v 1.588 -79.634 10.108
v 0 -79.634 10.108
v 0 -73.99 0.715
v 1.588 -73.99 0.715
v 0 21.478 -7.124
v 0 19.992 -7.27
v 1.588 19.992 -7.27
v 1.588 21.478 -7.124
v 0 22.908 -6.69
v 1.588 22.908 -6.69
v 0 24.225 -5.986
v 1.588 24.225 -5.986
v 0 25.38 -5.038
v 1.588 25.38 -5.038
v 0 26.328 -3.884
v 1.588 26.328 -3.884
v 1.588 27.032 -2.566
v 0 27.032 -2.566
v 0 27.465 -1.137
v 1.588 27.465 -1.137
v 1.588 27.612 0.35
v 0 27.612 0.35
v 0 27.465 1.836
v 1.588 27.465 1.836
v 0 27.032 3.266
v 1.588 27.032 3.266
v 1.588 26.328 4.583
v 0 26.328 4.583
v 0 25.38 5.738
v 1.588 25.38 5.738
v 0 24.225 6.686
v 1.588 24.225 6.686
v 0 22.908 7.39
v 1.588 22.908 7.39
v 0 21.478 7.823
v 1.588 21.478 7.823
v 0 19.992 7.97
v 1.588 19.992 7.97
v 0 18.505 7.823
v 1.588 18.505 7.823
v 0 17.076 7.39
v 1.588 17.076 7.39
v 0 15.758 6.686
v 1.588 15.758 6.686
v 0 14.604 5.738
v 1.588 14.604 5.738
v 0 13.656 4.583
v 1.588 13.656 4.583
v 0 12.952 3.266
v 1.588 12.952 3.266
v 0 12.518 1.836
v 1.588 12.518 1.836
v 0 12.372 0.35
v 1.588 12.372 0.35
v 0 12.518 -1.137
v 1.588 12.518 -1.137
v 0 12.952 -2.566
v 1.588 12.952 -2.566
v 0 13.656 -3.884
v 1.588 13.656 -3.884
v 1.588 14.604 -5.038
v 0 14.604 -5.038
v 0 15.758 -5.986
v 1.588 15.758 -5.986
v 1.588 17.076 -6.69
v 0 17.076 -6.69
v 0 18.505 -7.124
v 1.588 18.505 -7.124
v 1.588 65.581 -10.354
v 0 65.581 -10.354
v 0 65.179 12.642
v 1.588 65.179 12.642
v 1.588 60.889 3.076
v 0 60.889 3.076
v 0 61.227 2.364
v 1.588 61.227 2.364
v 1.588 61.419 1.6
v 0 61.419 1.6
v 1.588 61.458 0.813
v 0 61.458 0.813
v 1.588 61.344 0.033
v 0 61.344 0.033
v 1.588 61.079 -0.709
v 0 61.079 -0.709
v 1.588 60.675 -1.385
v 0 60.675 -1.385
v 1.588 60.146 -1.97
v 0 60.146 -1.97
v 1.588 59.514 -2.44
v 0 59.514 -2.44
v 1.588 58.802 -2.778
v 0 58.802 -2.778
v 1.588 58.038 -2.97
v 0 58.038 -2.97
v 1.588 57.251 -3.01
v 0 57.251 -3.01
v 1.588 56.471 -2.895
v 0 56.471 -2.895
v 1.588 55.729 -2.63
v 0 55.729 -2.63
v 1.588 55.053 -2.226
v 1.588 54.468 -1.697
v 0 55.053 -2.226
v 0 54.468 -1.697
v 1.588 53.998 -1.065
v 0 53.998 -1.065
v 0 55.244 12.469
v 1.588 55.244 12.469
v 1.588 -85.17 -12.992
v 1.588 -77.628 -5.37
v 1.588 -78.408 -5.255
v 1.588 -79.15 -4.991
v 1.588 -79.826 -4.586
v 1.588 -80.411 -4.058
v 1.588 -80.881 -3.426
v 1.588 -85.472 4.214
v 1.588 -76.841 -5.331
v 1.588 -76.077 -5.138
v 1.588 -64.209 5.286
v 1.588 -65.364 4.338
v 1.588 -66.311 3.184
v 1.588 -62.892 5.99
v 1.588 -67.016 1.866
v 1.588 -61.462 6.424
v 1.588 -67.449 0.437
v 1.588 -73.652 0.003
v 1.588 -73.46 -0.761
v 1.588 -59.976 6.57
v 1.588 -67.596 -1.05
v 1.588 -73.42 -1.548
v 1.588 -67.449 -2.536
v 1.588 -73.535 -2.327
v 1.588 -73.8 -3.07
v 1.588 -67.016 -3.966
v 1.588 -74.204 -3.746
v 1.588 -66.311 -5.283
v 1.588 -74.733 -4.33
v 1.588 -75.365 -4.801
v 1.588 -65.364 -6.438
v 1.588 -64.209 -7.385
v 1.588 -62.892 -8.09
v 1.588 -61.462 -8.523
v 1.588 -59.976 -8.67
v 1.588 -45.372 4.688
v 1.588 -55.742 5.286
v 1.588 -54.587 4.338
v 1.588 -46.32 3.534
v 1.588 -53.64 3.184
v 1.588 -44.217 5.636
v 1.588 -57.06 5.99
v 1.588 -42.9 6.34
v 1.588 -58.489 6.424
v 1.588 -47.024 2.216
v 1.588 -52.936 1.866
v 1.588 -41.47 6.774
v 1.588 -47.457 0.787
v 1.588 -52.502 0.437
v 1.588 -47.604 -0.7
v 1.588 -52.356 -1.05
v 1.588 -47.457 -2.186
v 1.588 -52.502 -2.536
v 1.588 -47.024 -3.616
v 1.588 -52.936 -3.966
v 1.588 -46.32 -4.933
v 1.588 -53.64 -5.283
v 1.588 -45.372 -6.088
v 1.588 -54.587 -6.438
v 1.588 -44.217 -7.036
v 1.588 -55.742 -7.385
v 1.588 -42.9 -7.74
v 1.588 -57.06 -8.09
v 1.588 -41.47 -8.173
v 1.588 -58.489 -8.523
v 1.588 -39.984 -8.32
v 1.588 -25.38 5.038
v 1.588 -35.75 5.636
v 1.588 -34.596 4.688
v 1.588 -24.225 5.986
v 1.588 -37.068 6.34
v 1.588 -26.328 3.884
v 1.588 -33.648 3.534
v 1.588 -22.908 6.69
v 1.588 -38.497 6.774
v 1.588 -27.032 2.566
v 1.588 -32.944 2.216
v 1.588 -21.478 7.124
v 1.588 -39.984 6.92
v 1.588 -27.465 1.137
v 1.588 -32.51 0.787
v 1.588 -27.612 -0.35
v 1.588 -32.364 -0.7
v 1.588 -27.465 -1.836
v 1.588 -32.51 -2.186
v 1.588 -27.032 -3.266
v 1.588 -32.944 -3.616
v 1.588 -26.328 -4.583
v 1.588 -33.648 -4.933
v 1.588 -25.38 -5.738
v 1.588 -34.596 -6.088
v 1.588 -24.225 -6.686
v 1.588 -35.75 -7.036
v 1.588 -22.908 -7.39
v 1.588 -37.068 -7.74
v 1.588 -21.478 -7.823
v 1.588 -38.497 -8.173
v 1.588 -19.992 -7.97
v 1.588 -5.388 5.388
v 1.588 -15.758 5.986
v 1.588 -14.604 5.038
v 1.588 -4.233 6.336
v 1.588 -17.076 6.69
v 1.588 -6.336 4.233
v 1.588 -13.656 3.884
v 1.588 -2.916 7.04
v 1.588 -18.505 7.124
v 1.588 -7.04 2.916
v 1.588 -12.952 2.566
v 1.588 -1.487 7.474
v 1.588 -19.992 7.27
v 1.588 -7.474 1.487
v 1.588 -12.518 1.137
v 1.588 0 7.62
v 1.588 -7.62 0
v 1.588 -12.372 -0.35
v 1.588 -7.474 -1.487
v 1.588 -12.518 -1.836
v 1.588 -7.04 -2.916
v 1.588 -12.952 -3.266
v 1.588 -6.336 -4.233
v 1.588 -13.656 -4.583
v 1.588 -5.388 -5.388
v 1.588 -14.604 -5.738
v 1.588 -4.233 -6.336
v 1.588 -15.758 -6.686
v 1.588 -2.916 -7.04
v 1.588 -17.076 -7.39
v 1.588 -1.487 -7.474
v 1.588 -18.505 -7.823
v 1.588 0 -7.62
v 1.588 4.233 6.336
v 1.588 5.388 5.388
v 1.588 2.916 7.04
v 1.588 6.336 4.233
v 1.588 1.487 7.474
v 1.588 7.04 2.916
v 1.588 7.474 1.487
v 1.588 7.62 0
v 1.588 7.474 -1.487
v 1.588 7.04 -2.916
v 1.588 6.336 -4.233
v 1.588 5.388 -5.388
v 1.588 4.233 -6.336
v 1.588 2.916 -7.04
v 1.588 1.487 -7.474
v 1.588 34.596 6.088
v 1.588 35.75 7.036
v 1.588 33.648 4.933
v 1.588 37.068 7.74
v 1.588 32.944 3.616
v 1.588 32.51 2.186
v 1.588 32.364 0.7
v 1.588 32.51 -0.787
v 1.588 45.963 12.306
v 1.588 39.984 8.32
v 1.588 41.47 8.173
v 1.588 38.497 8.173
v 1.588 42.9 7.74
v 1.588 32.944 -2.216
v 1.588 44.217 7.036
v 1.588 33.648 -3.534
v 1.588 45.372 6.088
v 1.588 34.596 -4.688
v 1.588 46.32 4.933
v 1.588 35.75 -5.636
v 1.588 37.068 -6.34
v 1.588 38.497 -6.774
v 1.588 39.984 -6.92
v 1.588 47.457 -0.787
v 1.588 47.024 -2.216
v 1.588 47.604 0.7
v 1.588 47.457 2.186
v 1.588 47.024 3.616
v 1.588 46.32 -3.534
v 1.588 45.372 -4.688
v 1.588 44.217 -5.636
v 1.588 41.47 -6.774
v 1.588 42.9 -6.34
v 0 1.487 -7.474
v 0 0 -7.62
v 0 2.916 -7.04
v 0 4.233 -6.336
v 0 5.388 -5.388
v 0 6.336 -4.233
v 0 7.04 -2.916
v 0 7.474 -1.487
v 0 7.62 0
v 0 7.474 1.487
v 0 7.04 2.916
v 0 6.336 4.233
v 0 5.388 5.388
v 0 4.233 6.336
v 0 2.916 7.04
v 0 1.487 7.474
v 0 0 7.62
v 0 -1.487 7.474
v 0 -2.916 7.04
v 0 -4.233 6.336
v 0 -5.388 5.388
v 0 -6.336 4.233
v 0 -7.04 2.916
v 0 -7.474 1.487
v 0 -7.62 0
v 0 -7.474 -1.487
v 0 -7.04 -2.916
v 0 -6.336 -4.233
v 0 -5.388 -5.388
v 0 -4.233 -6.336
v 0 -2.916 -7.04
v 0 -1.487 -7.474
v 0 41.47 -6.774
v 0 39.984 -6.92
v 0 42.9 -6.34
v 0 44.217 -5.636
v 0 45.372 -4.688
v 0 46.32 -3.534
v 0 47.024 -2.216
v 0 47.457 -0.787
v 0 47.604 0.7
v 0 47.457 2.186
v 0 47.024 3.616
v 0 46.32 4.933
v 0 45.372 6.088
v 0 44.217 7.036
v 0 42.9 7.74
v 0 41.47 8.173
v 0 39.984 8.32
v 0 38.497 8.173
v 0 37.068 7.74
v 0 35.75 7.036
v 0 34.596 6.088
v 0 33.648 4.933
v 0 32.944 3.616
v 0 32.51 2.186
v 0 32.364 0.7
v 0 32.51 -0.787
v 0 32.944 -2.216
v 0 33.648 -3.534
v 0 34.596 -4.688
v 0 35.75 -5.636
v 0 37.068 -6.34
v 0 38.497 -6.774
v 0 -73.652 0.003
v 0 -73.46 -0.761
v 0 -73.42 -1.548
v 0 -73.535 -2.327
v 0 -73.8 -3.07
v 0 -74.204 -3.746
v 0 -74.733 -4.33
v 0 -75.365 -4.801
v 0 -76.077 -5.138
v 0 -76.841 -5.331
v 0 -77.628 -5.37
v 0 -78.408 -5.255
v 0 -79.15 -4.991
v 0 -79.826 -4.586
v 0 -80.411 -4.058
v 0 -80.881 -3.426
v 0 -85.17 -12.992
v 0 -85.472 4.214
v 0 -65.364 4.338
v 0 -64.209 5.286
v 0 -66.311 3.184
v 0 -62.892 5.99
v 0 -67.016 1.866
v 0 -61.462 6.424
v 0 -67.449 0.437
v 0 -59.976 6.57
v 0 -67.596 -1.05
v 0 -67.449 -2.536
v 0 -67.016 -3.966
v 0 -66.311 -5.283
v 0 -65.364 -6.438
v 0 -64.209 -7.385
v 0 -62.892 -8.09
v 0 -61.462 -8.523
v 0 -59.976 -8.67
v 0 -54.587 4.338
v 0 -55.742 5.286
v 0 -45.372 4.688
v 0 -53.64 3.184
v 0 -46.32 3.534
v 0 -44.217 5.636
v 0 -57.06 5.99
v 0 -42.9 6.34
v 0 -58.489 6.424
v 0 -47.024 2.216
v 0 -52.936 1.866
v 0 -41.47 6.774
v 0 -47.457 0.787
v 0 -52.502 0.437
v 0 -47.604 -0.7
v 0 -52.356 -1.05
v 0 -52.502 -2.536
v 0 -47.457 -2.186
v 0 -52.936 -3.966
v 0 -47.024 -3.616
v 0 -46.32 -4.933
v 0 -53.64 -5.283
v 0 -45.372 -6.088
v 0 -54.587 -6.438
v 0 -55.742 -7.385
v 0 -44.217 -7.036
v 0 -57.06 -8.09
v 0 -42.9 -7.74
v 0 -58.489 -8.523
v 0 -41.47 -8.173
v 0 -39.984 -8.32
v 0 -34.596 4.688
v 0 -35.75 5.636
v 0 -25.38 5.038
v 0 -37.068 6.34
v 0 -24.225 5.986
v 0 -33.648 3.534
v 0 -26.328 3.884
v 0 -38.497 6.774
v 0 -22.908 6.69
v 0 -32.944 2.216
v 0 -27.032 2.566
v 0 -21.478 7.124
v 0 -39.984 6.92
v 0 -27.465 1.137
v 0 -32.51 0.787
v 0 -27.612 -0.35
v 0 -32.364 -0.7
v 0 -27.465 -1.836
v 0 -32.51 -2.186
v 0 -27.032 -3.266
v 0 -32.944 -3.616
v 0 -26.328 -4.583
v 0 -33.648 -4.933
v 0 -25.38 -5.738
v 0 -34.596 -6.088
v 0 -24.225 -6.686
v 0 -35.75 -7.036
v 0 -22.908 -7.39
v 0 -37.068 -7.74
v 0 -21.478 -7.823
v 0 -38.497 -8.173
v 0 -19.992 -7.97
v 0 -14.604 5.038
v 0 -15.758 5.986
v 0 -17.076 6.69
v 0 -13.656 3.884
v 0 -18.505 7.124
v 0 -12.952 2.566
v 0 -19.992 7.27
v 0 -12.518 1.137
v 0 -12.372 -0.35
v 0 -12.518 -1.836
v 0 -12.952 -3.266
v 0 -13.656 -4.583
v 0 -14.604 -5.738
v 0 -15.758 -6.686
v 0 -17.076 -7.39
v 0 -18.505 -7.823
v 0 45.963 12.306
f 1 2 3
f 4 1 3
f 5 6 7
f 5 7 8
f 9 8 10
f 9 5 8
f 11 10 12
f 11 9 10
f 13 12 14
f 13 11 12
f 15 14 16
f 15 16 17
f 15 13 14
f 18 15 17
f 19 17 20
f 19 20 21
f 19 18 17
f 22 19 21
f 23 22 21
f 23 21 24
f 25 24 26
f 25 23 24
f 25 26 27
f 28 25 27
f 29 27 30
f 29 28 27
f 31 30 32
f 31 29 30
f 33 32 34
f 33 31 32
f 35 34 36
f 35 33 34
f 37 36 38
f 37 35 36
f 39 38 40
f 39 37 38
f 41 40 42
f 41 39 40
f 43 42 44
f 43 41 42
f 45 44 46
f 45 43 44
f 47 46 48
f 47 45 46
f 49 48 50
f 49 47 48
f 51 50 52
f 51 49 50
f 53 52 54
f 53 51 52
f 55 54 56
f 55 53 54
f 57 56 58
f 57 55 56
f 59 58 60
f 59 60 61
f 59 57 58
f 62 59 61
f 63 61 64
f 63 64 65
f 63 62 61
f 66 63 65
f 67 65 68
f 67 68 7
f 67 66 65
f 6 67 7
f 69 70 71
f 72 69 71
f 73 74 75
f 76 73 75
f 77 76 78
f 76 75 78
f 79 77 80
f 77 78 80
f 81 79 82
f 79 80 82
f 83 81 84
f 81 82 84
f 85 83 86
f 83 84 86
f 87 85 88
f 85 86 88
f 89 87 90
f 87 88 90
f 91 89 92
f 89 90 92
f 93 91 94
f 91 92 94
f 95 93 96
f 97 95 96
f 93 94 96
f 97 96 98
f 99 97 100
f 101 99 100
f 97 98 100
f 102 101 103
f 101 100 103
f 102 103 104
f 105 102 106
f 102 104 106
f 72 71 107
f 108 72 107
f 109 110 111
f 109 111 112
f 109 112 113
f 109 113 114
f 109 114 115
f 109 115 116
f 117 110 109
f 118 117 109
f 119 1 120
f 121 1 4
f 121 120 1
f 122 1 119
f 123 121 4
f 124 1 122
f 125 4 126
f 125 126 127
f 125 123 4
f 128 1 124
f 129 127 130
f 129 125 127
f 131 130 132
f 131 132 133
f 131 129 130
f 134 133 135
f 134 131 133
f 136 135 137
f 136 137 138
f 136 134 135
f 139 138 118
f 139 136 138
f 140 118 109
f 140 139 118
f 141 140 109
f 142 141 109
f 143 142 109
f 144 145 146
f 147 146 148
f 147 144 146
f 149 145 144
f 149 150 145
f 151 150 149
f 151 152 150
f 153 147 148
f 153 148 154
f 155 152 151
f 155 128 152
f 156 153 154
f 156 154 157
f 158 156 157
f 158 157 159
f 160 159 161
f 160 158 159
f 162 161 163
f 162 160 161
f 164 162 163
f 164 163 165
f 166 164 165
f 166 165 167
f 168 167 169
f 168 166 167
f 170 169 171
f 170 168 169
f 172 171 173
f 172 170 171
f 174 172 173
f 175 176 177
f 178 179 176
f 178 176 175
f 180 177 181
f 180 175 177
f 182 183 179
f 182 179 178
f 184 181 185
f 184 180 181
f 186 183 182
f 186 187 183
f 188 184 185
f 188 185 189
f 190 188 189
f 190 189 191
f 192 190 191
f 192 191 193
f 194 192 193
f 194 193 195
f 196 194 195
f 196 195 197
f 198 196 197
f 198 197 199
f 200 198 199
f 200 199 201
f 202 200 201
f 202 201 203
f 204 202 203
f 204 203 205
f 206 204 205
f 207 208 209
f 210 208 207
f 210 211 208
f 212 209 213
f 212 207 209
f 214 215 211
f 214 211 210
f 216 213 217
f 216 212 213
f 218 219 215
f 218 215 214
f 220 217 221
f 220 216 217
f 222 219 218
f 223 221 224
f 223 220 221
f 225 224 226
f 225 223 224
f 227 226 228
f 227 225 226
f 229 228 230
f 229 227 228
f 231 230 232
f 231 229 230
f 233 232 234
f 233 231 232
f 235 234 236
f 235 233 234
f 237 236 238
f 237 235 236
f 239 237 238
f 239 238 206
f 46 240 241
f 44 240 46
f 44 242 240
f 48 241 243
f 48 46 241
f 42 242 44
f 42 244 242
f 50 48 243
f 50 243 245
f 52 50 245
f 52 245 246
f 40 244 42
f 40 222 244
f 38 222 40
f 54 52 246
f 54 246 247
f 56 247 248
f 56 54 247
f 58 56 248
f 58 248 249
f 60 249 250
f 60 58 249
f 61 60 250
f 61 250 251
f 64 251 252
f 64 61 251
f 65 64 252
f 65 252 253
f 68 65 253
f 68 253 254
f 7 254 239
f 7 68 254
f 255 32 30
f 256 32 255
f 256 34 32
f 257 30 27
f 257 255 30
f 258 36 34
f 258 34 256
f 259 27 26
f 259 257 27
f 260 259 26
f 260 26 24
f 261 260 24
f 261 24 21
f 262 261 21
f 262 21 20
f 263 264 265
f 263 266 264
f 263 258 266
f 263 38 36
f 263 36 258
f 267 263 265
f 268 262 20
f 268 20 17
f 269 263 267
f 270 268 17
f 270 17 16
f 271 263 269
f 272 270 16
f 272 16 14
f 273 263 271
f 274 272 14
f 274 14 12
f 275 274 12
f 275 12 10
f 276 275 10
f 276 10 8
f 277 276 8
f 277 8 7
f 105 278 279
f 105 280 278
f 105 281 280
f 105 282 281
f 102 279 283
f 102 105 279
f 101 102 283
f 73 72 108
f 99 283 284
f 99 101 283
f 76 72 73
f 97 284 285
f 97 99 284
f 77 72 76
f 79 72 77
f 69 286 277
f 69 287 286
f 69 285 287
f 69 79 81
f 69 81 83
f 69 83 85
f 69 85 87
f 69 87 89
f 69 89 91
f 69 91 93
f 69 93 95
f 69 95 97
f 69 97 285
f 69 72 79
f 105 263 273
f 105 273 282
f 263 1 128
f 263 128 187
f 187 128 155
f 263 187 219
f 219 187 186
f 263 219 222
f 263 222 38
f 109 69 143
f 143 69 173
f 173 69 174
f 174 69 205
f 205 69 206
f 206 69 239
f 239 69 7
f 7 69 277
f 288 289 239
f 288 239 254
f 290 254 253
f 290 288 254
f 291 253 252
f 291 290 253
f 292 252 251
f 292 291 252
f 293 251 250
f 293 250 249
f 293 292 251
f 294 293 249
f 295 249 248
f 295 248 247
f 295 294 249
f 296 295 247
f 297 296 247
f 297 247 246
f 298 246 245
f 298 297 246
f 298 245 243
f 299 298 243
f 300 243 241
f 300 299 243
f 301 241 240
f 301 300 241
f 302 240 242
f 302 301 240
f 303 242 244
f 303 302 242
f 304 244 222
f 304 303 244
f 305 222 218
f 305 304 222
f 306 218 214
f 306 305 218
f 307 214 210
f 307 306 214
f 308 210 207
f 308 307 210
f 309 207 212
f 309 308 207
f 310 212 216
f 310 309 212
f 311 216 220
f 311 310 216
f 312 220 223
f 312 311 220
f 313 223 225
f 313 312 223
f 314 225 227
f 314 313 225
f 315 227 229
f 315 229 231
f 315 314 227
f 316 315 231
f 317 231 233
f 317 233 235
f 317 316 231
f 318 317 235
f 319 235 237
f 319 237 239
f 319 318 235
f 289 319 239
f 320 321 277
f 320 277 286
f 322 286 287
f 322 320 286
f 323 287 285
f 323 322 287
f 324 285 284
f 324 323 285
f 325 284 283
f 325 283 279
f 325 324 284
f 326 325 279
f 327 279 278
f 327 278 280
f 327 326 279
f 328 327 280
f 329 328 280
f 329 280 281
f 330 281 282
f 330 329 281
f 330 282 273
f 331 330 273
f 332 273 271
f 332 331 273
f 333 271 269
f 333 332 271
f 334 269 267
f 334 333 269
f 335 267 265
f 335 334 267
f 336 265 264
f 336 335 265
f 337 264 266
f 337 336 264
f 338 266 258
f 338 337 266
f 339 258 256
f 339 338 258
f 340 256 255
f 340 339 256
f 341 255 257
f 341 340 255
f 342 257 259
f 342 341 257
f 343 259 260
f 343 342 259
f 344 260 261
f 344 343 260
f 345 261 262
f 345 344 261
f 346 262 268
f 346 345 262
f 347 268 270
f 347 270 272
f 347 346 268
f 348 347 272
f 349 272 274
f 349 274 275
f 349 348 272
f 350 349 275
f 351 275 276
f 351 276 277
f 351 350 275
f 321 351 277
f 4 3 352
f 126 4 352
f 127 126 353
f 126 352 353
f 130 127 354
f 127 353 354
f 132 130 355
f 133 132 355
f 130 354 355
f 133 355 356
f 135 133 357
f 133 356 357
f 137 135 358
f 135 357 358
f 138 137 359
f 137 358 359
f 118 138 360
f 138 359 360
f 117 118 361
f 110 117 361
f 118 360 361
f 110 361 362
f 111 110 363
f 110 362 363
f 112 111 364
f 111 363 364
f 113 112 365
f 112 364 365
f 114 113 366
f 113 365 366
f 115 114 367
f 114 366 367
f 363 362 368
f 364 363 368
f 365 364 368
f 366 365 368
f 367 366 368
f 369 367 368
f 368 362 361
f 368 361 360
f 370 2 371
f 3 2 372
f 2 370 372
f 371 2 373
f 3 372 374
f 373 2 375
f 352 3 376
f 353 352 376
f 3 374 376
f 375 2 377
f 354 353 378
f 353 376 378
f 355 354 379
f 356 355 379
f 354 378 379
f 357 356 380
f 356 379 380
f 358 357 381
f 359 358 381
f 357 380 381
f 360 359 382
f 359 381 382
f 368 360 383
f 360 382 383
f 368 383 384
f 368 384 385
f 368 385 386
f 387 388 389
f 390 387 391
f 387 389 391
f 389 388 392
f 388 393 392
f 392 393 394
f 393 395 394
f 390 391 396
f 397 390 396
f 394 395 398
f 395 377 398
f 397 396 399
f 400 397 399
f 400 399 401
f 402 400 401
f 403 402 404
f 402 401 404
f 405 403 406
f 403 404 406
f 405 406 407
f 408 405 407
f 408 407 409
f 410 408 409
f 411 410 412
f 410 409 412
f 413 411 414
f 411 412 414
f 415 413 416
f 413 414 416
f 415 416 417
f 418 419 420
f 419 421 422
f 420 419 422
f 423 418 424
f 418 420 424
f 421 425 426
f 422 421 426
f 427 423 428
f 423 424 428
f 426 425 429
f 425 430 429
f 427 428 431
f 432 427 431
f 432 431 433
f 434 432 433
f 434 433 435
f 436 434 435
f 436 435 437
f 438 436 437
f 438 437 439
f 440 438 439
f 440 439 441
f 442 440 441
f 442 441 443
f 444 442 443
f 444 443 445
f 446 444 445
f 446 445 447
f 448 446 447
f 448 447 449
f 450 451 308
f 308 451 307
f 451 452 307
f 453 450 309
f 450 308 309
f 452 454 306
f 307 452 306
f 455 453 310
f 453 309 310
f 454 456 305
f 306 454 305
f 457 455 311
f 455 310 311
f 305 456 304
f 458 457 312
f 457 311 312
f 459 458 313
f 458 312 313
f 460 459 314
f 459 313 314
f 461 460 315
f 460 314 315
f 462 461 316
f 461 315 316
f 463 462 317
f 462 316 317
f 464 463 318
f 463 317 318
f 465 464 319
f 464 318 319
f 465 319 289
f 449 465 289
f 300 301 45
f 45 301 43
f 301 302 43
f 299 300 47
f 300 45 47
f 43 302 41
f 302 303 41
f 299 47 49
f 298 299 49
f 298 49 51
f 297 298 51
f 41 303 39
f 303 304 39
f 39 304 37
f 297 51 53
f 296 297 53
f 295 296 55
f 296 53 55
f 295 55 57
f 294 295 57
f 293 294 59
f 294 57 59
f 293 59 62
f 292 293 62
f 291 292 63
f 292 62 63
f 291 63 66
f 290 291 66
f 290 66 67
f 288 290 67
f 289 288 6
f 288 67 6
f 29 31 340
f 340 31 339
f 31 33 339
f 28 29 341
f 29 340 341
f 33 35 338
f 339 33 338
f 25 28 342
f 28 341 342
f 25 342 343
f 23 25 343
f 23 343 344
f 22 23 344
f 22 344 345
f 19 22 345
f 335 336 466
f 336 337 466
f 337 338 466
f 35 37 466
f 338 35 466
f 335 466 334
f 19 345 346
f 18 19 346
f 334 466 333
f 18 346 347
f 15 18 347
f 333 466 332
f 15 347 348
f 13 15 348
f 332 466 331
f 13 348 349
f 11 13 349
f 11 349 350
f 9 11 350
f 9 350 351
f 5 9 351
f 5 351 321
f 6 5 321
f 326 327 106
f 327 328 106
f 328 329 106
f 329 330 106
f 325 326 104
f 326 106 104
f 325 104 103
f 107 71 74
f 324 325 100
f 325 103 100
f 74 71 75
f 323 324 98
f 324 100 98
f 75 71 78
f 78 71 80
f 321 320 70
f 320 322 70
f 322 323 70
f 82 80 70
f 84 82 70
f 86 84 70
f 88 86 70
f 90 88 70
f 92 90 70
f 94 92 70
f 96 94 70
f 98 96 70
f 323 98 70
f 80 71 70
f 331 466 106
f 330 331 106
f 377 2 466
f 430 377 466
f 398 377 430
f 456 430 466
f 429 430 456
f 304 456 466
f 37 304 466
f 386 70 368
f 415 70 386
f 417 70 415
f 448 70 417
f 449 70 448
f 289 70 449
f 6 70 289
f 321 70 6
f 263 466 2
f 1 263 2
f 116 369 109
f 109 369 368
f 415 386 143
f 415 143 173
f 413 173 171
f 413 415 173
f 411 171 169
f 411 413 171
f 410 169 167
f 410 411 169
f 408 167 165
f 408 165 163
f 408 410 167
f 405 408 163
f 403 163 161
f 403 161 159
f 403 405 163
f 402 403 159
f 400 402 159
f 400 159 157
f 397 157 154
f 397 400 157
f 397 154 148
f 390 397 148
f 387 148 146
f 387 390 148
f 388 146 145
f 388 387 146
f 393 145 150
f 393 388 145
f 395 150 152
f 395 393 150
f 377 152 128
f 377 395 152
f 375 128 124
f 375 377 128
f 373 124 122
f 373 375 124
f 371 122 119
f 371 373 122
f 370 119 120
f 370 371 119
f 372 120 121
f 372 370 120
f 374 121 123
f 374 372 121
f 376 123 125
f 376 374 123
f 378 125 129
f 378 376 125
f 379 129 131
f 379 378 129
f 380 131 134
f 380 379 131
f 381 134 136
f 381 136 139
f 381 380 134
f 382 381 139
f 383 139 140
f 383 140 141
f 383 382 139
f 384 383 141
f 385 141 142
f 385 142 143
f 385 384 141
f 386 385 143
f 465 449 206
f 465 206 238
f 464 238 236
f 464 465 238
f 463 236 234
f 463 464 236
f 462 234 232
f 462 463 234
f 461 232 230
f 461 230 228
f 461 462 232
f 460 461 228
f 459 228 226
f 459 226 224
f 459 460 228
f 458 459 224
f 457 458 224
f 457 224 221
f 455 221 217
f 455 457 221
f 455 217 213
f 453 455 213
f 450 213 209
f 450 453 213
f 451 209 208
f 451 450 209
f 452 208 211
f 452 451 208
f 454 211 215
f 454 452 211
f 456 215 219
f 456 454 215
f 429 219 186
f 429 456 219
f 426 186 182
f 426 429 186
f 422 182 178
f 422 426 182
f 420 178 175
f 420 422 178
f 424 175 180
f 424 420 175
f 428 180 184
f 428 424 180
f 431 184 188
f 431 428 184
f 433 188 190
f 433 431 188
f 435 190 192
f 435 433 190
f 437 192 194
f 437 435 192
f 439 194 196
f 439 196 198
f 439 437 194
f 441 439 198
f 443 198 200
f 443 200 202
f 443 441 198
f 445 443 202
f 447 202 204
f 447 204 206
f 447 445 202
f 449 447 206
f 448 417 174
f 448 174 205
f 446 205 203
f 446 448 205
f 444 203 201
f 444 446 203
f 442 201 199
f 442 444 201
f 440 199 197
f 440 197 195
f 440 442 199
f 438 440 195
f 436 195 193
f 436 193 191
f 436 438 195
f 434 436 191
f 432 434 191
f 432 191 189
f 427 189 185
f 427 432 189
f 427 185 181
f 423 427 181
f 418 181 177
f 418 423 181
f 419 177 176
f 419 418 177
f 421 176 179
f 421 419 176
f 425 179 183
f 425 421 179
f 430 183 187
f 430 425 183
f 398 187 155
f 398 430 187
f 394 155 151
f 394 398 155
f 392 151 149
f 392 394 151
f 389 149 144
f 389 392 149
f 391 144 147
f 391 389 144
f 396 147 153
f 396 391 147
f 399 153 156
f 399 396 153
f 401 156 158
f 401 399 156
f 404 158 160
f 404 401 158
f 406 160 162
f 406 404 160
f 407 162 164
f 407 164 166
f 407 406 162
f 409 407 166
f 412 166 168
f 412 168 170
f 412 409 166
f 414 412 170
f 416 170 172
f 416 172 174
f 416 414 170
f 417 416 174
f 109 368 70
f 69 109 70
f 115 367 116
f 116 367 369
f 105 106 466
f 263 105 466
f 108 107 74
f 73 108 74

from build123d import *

# Parameters (mm, degrees)
SKETCH1_R           = 7.62
BOSS_EXTRUDE1_DEPTH = 1.5875


with BuildPart() as part:
    # Sketch1 → Boss-Extrude1 (new body)
    with BuildSketch(Plane(origin=(0, 0, 0), x_dir=(0, 0, -1), z_dir=(1, 0, 0))):
        with BuildLine():
            Line((-12.642487664, 65.178590664), (-12.468624959, 55.244460434))
            Line((-12.468624959, 55.244460434), (-3.075732618, 60.888873679))
            ThreePointArc((-3.075732618, 60.888873679), (2.439979404, 59.513924484), (1.065030209, 53.998212461))
            Line((1.065030209, 53.998212461), (-12.306187241, 45.963128683))
            Line((-12.306187241, 45.963128683), (-10.108033982, -79.634484144))
            Line((-10.108033982, -79.634484144), (-0.715141642, -73.990070899))
            ThreePointArc((-0.715141642, -73.990070899), (4.800570381, -75.365020094), (3.425621185, -80.880732117))
            Line((3.425621185, -80.880732117), (-4.214042055, -85.47158814))
            Line((-4.214042055, -85.47158814), (12.992376231, -85.170449101))
            Line((12.992376231, -85.170449101), (10.353990645, 65.581064744))
            Line((10.353990645, 65.581064744), (-12.642487664, 65.178590664))
        make_face()
        with Locations((-0.699777134, 39.983716876)):
            Circle(SKETCH1_R, mode=Mode.SUBTRACT)
        with Locations((-0.349888567, 19.991858438)):
            Circle(SKETCH1_R, mode=Mode.SUBTRACT)
        Circle(SKETCH1_R, mode=Mode.SUBTRACT)
        with Locations((0.349888567, -19.991858438)):
            Circle(SKETCH1_R, mode=Mode.SUBTRACT)
        with Locations((0.699777134, -39.983716876)):
            Circle(SKETCH1_R, mode=Mode.SUBTRACT)
        with Locations((1.049665701, -59.975575313)):
            Circle(SKETCH1_R, mode=Mode.SUBTRACT)
    extrude(amount=BOSS_EXTRUDE1_DEPTH)


solid = part.part
